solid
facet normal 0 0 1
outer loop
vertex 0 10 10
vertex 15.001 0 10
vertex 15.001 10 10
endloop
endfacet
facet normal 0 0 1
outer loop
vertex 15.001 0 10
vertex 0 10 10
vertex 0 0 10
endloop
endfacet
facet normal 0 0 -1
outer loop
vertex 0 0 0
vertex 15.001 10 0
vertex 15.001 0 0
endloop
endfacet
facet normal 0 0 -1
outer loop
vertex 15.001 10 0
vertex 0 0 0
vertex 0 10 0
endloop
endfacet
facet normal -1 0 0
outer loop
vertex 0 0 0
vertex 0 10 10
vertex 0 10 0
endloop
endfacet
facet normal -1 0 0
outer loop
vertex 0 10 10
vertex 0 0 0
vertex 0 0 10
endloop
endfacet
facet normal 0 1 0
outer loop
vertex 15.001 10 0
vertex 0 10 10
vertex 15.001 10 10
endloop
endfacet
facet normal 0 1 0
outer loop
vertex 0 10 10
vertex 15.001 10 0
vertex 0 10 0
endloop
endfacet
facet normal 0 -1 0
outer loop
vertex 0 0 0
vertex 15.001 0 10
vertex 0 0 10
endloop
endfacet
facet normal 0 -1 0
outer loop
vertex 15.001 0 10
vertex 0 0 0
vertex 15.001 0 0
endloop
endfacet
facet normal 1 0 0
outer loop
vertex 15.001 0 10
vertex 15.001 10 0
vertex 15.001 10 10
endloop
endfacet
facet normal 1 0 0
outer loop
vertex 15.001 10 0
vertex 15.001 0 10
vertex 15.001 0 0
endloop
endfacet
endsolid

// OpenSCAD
color("red") cube(10);
color("blue") translate([5,0,0]) cube([10.001, 10, 10]);
